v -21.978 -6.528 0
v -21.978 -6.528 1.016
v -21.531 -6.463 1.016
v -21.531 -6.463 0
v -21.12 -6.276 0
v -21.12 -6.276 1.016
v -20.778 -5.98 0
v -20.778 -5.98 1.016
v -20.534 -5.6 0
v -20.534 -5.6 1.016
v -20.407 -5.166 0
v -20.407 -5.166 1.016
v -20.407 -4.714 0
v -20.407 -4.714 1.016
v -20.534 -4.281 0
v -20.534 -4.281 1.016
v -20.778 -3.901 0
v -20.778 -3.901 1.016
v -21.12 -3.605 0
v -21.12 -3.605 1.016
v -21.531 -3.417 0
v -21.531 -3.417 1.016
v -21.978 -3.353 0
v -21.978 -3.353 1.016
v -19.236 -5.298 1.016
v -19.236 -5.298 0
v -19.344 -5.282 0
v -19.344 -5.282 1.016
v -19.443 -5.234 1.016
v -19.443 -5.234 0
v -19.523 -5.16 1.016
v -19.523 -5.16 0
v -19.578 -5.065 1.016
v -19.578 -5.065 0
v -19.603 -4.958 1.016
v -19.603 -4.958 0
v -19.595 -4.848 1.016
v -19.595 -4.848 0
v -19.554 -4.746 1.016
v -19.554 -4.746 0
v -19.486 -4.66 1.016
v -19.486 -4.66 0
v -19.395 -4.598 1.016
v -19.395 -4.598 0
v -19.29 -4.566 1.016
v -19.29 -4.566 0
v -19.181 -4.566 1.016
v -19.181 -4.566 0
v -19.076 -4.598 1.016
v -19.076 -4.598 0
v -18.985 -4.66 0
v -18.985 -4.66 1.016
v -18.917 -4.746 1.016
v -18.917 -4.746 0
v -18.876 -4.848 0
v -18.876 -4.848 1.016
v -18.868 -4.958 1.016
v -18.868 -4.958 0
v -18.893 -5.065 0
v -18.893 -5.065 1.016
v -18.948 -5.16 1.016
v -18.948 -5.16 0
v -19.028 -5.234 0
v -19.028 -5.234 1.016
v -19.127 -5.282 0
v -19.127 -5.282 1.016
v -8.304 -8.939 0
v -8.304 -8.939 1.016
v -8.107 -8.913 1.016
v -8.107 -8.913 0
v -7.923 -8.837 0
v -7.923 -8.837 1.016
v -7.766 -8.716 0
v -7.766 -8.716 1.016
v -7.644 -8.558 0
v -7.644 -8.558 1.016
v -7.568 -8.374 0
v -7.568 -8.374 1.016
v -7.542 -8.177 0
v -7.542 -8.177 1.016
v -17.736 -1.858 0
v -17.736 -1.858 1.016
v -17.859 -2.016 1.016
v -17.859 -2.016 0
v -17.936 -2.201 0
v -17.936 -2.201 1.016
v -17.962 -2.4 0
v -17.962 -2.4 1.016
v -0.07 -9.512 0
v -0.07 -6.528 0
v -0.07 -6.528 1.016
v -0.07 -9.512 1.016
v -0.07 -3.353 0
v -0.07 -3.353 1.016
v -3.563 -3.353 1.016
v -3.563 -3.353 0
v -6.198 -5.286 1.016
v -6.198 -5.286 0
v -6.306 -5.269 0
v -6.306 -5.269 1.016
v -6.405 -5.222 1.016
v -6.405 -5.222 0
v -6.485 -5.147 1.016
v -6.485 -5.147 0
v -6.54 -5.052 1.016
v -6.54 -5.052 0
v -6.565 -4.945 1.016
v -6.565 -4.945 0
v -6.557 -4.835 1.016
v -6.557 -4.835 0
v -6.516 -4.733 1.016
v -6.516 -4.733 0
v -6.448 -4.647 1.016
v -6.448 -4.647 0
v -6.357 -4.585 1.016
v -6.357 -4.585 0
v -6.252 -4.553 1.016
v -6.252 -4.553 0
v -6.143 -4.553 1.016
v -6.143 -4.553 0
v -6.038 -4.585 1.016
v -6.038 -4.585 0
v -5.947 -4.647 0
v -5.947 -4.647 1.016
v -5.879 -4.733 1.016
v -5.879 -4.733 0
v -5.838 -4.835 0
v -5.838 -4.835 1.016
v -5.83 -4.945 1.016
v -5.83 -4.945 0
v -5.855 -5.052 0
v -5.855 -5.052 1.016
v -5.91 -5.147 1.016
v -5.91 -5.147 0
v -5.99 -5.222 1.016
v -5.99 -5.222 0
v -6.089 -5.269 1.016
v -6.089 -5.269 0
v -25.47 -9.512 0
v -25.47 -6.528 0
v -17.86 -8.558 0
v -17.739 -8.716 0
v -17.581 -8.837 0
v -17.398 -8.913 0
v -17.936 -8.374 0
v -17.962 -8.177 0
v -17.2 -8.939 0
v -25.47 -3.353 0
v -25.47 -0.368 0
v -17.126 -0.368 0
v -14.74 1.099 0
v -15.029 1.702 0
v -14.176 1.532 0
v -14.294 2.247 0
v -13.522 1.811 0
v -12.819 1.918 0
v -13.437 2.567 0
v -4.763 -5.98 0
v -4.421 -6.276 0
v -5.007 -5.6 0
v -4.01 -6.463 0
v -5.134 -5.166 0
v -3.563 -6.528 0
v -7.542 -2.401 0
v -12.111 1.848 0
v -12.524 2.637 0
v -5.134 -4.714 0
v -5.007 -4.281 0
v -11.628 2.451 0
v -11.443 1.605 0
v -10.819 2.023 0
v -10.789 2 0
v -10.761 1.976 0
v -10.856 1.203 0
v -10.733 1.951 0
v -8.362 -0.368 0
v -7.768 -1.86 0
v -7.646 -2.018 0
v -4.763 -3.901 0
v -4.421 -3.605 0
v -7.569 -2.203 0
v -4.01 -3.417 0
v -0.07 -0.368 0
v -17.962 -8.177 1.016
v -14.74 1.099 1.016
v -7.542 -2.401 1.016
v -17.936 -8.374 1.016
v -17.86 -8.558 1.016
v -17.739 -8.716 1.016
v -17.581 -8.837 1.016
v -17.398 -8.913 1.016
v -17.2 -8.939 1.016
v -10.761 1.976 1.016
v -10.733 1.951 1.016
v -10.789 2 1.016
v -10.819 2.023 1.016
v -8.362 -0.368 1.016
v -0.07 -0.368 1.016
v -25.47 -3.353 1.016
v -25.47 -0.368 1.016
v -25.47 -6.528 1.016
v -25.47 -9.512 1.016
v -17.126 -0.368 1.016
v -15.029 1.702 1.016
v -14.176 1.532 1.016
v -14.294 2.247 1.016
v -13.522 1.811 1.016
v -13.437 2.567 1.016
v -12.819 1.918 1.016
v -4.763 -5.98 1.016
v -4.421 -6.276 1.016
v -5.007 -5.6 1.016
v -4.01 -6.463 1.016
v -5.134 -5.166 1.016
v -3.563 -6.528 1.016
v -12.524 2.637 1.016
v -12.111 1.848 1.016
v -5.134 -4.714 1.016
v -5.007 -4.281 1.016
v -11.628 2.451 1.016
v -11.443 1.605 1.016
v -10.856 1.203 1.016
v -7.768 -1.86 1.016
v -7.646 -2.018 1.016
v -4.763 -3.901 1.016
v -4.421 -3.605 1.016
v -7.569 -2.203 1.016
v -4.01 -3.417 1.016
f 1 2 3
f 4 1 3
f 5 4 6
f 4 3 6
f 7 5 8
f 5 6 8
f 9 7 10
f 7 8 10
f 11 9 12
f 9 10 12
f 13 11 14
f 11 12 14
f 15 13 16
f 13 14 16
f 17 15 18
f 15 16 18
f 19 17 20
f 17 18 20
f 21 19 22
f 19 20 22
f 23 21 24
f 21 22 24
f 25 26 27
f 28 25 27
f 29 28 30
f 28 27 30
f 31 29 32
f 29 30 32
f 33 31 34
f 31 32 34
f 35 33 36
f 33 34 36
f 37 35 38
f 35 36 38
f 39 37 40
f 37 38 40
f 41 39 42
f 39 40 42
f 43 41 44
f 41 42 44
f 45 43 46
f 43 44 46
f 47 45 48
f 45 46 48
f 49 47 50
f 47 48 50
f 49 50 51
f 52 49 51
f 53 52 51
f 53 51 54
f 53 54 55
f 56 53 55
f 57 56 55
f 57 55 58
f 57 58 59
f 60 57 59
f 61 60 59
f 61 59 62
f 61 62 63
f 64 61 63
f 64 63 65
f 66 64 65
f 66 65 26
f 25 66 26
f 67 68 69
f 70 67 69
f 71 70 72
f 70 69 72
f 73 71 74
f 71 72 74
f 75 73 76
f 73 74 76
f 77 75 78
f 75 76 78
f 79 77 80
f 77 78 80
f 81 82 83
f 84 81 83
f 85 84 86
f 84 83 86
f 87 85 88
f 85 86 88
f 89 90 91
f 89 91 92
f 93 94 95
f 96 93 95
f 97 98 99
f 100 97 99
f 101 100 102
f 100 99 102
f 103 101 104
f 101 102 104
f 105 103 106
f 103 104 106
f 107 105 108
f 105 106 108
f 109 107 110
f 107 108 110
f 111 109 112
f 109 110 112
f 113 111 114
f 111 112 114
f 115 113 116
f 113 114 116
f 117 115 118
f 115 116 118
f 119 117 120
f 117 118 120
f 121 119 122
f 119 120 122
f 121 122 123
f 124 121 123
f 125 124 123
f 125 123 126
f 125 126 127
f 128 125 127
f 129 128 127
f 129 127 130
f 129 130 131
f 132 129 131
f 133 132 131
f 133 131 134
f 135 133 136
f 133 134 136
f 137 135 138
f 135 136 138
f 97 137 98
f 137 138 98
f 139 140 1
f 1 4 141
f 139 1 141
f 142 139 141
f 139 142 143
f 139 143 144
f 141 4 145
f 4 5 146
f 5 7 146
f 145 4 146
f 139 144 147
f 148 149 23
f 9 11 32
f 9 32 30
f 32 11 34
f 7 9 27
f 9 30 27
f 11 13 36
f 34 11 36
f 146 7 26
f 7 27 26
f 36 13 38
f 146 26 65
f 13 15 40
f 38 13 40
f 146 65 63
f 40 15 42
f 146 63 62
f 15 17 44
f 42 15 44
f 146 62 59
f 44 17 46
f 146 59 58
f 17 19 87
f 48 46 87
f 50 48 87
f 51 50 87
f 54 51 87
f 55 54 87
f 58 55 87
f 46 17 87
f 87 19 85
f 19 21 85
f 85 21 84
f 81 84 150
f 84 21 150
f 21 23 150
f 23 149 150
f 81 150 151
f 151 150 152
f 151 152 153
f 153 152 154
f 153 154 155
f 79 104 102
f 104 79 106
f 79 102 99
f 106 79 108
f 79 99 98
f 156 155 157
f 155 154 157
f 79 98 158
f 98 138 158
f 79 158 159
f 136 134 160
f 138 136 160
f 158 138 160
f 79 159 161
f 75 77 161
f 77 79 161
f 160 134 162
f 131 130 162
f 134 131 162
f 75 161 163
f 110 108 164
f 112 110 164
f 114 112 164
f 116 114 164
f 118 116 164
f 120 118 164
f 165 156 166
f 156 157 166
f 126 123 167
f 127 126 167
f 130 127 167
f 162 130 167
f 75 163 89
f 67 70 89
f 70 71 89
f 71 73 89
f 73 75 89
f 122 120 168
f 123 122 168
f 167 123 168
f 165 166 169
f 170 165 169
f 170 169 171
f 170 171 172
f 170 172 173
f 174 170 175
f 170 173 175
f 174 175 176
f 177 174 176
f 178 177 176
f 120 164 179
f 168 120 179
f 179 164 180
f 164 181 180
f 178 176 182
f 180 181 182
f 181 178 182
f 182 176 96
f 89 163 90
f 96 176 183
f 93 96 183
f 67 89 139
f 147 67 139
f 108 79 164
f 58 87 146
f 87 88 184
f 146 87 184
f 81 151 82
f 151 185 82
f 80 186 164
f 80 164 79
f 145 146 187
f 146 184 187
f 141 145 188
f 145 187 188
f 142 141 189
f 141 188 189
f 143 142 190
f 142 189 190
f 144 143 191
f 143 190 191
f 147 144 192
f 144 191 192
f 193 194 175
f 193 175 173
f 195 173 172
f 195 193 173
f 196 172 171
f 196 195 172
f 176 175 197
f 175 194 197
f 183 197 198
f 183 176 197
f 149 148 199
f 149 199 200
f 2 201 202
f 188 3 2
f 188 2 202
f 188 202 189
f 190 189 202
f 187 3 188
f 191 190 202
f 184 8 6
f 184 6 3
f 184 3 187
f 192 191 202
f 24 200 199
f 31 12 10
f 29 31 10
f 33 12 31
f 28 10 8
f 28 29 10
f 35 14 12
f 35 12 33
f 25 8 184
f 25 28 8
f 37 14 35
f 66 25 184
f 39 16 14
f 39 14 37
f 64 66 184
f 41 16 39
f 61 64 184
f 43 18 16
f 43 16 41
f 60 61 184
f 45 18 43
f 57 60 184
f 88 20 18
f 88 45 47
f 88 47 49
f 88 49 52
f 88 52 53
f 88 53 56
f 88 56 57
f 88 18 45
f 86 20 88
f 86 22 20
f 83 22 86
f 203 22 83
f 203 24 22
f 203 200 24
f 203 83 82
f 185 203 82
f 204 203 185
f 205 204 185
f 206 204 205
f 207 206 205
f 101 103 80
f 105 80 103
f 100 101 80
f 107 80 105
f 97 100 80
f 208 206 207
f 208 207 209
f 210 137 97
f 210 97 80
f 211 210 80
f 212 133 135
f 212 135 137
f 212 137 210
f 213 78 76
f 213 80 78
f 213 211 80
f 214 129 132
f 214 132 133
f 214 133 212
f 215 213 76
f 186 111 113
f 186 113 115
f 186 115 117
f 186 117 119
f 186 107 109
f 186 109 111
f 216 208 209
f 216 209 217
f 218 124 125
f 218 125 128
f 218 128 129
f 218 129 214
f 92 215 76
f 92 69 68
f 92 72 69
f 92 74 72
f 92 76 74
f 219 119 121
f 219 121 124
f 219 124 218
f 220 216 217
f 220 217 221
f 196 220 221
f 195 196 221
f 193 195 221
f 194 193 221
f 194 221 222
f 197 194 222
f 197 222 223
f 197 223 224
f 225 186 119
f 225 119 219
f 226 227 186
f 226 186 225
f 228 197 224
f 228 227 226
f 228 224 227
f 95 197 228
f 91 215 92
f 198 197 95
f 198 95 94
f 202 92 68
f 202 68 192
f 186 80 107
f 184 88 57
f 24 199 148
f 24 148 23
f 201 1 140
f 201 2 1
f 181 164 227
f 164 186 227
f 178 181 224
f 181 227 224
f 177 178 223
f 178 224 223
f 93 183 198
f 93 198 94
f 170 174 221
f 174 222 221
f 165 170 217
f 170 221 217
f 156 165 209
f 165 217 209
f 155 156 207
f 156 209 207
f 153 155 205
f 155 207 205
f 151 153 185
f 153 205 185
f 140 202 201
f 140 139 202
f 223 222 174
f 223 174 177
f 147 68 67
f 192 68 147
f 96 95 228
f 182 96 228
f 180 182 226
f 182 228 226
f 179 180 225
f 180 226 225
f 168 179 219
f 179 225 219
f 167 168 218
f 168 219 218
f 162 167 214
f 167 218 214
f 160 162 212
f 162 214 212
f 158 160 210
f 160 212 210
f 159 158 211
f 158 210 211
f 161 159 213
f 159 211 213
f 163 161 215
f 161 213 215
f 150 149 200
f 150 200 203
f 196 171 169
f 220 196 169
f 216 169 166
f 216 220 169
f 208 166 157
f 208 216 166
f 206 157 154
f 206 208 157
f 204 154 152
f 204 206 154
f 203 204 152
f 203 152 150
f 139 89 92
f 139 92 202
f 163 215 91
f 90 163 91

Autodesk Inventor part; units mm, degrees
ref_plane "YZ Plane" through (0, 0, 0) normal (1, 0, 0) x (0, 1, 0)
ref_plane "XZ Plane" through (0, 0, 0) normal (0, 1, 0) x (-1, 0, 0)
ref_plane "XY Plane" through (0, 0, 0) normal (0, 0, 1) x (1, 0, 0)
sketch "Block1" plane through (0, 0, 0) normal (0, 0, 1) x (1, 0, 0)
  line L0 (-17.5911, -8.406) -> (-17.5911, -2.6569)
  arc A0 (-15.6308, 0.6431) -> (-17.4939, -2.2845) centre (9.5285, -17.4245) ccw
  arc A1 (-17.4939, -2.2845) -> (-17.5911, -2.6569) centre (-16.8291, -2.6569) ccw
  line L1 (-13.0521, -3.6322) -> (-2.9855, -3.6322)
  line L2 (-2.9855, -3.6322) -> (-2.9855, -10.0136)
  line L3 (-2.9855, -10.0136) -> (-13.0521, -10.0136)
  line L4 (-13.0521, -10.0136) -> (-13.0521, -3.6322)
  ellipse E0 centre (-8.0188, -3.6322) end of major axis (-8.0188, -7.4704) minor radius 2.9685
  point P0 (-13.9703, -5.5207)
  point P1 (-17.5911, -2.4593)
  dimension "d111" = 0.762
sketch "Block2" plane through (0, 0, 0) normal (0, 0, 1) x (1, 0, 0)
  line L0 (-7.8958, -2.4967) -> (-7.8958, -8.4058)
  line L1 (-8.6339, -9.168) -> (-16.8291, -9.168)
  ellipse E0 centre (-12.6564, -2.1178) end of major axis (-12.6564, -6.4967) minor radius 3.853 (-9.6585, 0.6329) -> (-15.6415, 0.6509) ccw
  arc A0 (-7.8958, -2.4967) -> (-9.6091, 0.6391) centre (-35.8892, -15.7554) ccw
  line L2 (-17.6018, -8.3981) -> (-17.6018, -2.6491)
  arc A1 (-15.6415, 0.6509) -> (-17.5045, -2.2766) centre (9.5178, -17.4167) ccw
  arc A2 (-17.5045, -2.2766) -> (-17.6018, -2.6491) centre (-16.8398, -2.6491) ccw
  line L3 (-13.0627, -3.6243) -> (-2.9962, -3.6243)
  line L4 (-2.9962, -3.6243) -> (-2.9962, -10.0058)
  line L5 (-2.9962, -10.0058) -> (-13.0627, -10.0058)
  line L6 (-13.0627, -10.0058) -> (-13.0627, -3.6243)
  ellipse E1 centre (-8.0295, -3.6243) end of major axis (-8.0295, -7.4625) minor radius 2.9685
  point P0 (-12.2397, -5.1213)
sketch "Block3" plane through (0, 0, 0) normal (0, 0, 1) x (1, 0, 0)
  arc A0 (-17.5911, -8.406) -> (-16.8291, -9.168) centre (-16.8291, -8.406) ccw
  arc A1 (-8.6339, -9.168) -> (-7.8719, -8.406) centre (-8.6339, -8.406) ccw
  line L0 (-7.8958, -2.4967) -> (-7.8958, -8.4058)
  line L1 (-8.6339, -9.168) -> (-16.8291, -9.168)
  ellipse E0 centre (-12.6564, -2.1178) end of major axis (-12.6564, -6.4967) minor radius 3.853 (-9.6585, 0.6329) -> (-15.6415, 0.6509) ccw
  arc A2 (-7.8958, -2.4967) -> (-9.6091, 0.6391) centre (-35.8892, -15.7554) ccw
  line L2 (-17.6018, -8.3981) -> (-17.6018, -2.6491)
  arc A3 (-15.6415, 0.6509) -> (-17.5045, -2.2766) centre (9.5178, -17.4167) ccw
  arc A4 (-17.5045, -2.2766) -> (-17.6018, -2.6491) centre (-16.8398, -2.6491) ccw
  line L3 (-13.0627, -3.6243) -> (-2.9962, -3.6243)
  line L4 (-2.9962, -3.6243) -> (-2.9962, -10.0058)
  line L5 (-2.9962, -10.0058) -> (-13.0627, -10.0058)
  line L6 (-13.0627, -10.0058) -> (-13.0627, -3.6243)
  ellipse E1 centre (-8.0295, -3.6243) end of major axis (-8.0295, -7.4625) minor radius 2.9685
  point P0 (-12.6868, -8.3844)
  dimension "d110" = 0.762
sketch "Block4" plane through (0, 0, 0) normal (0, 0, 1) x (1, 0, 0)
  arc A0 (-17.5911, -8.406) -> (-16.8291, -9.168) centre (-16.8291, -8.406) ccw
  arc A1 (-8.6339, -9.168) -> (-7.8719, -8.406) centre (-8.6339, -8.406) ccw
  line L0 (-7.8958, -2.4967) -> (-7.8958, -8.4058)
  line L1 (-8.6339, -9.168) -> (-16.8291, -9.168)
  ellipse E0 centre (-12.6564, -2.1178) end of major axis (-12.6564, -6.4967) minor radius 3.853 (-9.6585, 0.6329) -> (-15.6415, 0.6509) ccw
  arc A2 (-7.8958, -2.4967) -> (-9.6091, 0.6391) centre (-35.8892, -15.7554) ccw
  line L2 (-17.6018, -8.3981) -> (-17.6018, -2.6491)
  arc A3 (-15.6415, 0.6509) -> (-17.5045, -2.2766) centre (9.5178, -17.4167) ccw
  arc A4 (-17.5045, -2.2766) -> (-17.6018, -2.6491) centre (-16.8398, -2.6491) ccw
  line L3 (-13.0627, -3.6243) -> (-2.9962, -3.6243)
  line L4 (-2.9962, -3.6243) -> (-2.9962, -10.0058)
  line L5 (-2.9962, -10.0058) -> (-13.0627, -10.0058)
  line L6 (-13.0627, -10.0058) -> (-13.0627, -3.6243)
  ellipse E1 centre (-8.0295, -3.6243) end of major axis (-8.0295, -7.4625) minor radius 2.9685
  point P0 (-12.6868, -8.3844)
sketch "Block5" plane through (0, 0, 0) normal (0, 0, 1) x (1, 0, 0)
  ellipse E0 centre (-12.7876, -1.8459) end of major axis (-12.7876, -5.6516) minor radius 3.3457 (-10.6846, 1.114) -> (-14.8941, 1.1109) ccw
  arc A0 (-15.6984, 0.3796) -> (-14.8859, 1.1184) centre (-85.8065, 78.298) ccw
  arc A1 (-10.6894, 1.1184) -> (-9.8669, 0.3716) centre (60.1779, 78.3469) ccw
  point P0 (-12.7899, 8.9309)
sketch "Block6" plane through (0, 0, 0) normal (0, 0, 1) x (1, 0, 0)
  arc A0 (-10.9697, 1.4333) -> (-15.1792, 1.1122) centre (-12.8849, -1.2117) ccw
  line L0 (-15.1792, 1.1122) -> (-17.7718, -1.4473)
  line L1 (-10.8839, 1.361) -> (-8.0119, -1.4473)
  line L2 (-17.7718, -1.4473) -> (-8.0119, -1.4473)
  arc A1 (-10.8839, 1.361) -> (-10.9697, 1.4333) centre (-11.4166, 0.8161) ccw
  point P0 (-12.0633, -0.3449)
  point P1 (-10.9214, 1.3977)
  dimension "d153" = 0.762
sketch "Sketch1" plane through (0, 0, 0) normal (0, 0, 1) x (1, 0, 0)
  line L0 (-25.4704, -0.3682) -> (-0.0704, -0.3682)
  line L1 (-0.0704, -0.3682) -> (-0.0704, -9.5122)
  line L2 (-0.0704, -9.5122) -> (-25.4704, -9.5122)
  line L3 (-25.4704, -9.5122) -> (-25.4704, -0.3682)
extrude "Extrusion1" add sketch "Sketch1" along normal blind 1.016
sketch "Sketch2" plane through (0, 0, 1.016) normal (0, 0, 1) x (1, 0, 0)
  line L0 (-15.6279, -1.8922) -> (-9.9129, -1.8922)
  line L1 (-8.3254, -3.4797) -> (-8.3254, -6.4007)
  line L2 (-9.9129, -7.9882) -> (-15.6279, -7.9882)
  line L3 (-17.2154, -6.4007) -> (-17.2154, -3.4797)
  arc A0 (-15.6279, -1.8922) -> (-17.2154, -3.4797) centre (-15.6279, -3.4797) ccw
  arc A1 (-17.2154, -6.4007) -> (-15.6279, -7.9882) centre (-15.6279, -6.4007) ccw
  arc A2 (-9.9129, -7.9882) -> (-8.3254, -6.4007) centre (-9.9129, -6.4007) ccw
  arc A3 (-8.3254, -3.4797) -> (-9.9129, -1.8922) centre (-9.9129, -3.4797) ccw
extrude "Extrusion2" cut sketch "Sketch2" against normal blind 1.016
sketch "Sketch3" plane through (0, 0, 1.016) normal (0, 0, 1) x (1, 0, 0)
  line L0 (-0.0704, -0.3682) -> (-0.0704, -9.5122) projected
  line L1 (-25.4704, -9.5122) -> (-25.4704, -0.3682) projected
  line L2 (-0.0704, -9.5122) -> (-25.4704, -9.5122) projected
  line L3 (-25.4704, -3.3527) -> (-21.9779, -3.3527)
  line L4 (-20.3904, -4.9402) -> (-20.3904, -4.9402)
  line L5 (-21.9779, -6.5277) -> (-25.4704, -6.5277)
  arc A0 (-20.3904, -4.9402) -> (-21.9779, -3.3527) centre (-21.9779, -4.9402) ccw
  arc A1 (-21.9779, -6.5277) -> (-20.3904, -4.9402) centre (-21.9779, -4.9402) ccw
  line L6 (-0.0704, -3.3527) -> (-3.5629, -3.3527)
  line L7 (-5.1504, -4.9402) -> (-5.1504, -4.9402)
  line L8 (-3.5629, -6.5277) -> (-0.0704, -6.5277)
  arc A2 (-3.5629, -3.3527) -> (-5.1504, -4.9402) centre (-3.5629, -4.9402) ccw
  arc A3 (-5.1504, -4.9402) -> (-3.5629, -6.5277) centre (-3.5629, -4.9402) ccw
extrude "Extrusion3" cut sketch "Sketch3" against normal blind 1.016
sketch "Sketch13" plane through (0, 0, 1.016) normal (0, 0, 1) x (1, 0, 0)
  arc A0 (-10.8192, 2.023) -> (-15.0287, 1.7019) centre (-12.7344, -0.622) ccw
  line L0 (-15.0287, 1.7019) -> (-17.6213, -0.8576)
  line L1 (-10.7334, 1.9507) -> (-7.8614, -0.8576)
  line L2 (-17.6213, -0.8576) -> (-7.8614, -0.8576)
  arc A1 (-10.7334, 1.9507) -> (-10.8192, 2.023) centre (-11.2661, 1.4058) ccw
  point P0 (0, 0)
  point P1 (0, 0)
  point P2 (0, 0)
extrude "Extrusion8" add sketch "Sketch13" against normal blind 1.016
sketch "Sketch12" plane through (0, 0, 1.016) normal (0, 0, 1) x (1, 0, 0)
  line L0 (-7.5424, -2.4012) -> (-7.5424, -8.1771)
  line L1 (-8.3044, -8.9391) -> (-17.2004, -8.9391)
  line L2 (-17.9624, -2.4) -> (-17.9624, -8.1771)
  arc A0 (-17.9624, -8.1771) -> (-17.2004, -8.9391) centre (-17.2004, -8.1771) ccw
  arc A1 (-8.3044, -8.9391) -> (-7.5424, -8.1771) centre (-8.3044, -8.1771) ccw
  line L3 (-10.8562, 1.2031) -> (-7.7678, -1.8602)
  line L4 (-14.7403, 1.0994) -> (-17.7357, -1.8577)
  arc A2 (-10.847, 1.1949) -> (-14.7403, 1.0994) centre (-12.7429, -0.9239) ccw
  arc A3 (-17.7357, -1.8577) -> (-17.9624, -2.4) centre (-17.2004, -2.4) ccw
  arc A4 (-7.5424, -2.4012) -> (-7.7678, -1.8602) centre (-8.3044, -2.4012) ccw
  point P0 (0, 0)
  point P1 (-17.1532, -8.9391)
  point P2 (-17.9624, -7.9131)
  point P3 (-7.5424, -8.1803)
  point P4 (-8.3956, -8.9391)
  point P5 (0, 0)
  point P6 (-17.6124, -1.736)
  point P7 (-17.9624, -2.2782)
  point P8 (-7.8931, -1.7359)
  point P9 (-7.5424, -2.2782)
  dimension "d149" = 0.762
  dimension "d150" = 0.762
  dimension "d154" = 0.762
extrude "Extrusion7" cut sketch "Sketch12" against normal blind 1.016
hole "Hole9" at (-19.2355, -4.93, 1.016) direction (0, 0, -1) diameter 0.7366 depth 1.524
hole "Hole10" at (-6.1975, -4.9172, 1.016) direction (0, 0, -1) diameter 0.7366 depth 2.794
properties part number "headplateLP_tapped"
